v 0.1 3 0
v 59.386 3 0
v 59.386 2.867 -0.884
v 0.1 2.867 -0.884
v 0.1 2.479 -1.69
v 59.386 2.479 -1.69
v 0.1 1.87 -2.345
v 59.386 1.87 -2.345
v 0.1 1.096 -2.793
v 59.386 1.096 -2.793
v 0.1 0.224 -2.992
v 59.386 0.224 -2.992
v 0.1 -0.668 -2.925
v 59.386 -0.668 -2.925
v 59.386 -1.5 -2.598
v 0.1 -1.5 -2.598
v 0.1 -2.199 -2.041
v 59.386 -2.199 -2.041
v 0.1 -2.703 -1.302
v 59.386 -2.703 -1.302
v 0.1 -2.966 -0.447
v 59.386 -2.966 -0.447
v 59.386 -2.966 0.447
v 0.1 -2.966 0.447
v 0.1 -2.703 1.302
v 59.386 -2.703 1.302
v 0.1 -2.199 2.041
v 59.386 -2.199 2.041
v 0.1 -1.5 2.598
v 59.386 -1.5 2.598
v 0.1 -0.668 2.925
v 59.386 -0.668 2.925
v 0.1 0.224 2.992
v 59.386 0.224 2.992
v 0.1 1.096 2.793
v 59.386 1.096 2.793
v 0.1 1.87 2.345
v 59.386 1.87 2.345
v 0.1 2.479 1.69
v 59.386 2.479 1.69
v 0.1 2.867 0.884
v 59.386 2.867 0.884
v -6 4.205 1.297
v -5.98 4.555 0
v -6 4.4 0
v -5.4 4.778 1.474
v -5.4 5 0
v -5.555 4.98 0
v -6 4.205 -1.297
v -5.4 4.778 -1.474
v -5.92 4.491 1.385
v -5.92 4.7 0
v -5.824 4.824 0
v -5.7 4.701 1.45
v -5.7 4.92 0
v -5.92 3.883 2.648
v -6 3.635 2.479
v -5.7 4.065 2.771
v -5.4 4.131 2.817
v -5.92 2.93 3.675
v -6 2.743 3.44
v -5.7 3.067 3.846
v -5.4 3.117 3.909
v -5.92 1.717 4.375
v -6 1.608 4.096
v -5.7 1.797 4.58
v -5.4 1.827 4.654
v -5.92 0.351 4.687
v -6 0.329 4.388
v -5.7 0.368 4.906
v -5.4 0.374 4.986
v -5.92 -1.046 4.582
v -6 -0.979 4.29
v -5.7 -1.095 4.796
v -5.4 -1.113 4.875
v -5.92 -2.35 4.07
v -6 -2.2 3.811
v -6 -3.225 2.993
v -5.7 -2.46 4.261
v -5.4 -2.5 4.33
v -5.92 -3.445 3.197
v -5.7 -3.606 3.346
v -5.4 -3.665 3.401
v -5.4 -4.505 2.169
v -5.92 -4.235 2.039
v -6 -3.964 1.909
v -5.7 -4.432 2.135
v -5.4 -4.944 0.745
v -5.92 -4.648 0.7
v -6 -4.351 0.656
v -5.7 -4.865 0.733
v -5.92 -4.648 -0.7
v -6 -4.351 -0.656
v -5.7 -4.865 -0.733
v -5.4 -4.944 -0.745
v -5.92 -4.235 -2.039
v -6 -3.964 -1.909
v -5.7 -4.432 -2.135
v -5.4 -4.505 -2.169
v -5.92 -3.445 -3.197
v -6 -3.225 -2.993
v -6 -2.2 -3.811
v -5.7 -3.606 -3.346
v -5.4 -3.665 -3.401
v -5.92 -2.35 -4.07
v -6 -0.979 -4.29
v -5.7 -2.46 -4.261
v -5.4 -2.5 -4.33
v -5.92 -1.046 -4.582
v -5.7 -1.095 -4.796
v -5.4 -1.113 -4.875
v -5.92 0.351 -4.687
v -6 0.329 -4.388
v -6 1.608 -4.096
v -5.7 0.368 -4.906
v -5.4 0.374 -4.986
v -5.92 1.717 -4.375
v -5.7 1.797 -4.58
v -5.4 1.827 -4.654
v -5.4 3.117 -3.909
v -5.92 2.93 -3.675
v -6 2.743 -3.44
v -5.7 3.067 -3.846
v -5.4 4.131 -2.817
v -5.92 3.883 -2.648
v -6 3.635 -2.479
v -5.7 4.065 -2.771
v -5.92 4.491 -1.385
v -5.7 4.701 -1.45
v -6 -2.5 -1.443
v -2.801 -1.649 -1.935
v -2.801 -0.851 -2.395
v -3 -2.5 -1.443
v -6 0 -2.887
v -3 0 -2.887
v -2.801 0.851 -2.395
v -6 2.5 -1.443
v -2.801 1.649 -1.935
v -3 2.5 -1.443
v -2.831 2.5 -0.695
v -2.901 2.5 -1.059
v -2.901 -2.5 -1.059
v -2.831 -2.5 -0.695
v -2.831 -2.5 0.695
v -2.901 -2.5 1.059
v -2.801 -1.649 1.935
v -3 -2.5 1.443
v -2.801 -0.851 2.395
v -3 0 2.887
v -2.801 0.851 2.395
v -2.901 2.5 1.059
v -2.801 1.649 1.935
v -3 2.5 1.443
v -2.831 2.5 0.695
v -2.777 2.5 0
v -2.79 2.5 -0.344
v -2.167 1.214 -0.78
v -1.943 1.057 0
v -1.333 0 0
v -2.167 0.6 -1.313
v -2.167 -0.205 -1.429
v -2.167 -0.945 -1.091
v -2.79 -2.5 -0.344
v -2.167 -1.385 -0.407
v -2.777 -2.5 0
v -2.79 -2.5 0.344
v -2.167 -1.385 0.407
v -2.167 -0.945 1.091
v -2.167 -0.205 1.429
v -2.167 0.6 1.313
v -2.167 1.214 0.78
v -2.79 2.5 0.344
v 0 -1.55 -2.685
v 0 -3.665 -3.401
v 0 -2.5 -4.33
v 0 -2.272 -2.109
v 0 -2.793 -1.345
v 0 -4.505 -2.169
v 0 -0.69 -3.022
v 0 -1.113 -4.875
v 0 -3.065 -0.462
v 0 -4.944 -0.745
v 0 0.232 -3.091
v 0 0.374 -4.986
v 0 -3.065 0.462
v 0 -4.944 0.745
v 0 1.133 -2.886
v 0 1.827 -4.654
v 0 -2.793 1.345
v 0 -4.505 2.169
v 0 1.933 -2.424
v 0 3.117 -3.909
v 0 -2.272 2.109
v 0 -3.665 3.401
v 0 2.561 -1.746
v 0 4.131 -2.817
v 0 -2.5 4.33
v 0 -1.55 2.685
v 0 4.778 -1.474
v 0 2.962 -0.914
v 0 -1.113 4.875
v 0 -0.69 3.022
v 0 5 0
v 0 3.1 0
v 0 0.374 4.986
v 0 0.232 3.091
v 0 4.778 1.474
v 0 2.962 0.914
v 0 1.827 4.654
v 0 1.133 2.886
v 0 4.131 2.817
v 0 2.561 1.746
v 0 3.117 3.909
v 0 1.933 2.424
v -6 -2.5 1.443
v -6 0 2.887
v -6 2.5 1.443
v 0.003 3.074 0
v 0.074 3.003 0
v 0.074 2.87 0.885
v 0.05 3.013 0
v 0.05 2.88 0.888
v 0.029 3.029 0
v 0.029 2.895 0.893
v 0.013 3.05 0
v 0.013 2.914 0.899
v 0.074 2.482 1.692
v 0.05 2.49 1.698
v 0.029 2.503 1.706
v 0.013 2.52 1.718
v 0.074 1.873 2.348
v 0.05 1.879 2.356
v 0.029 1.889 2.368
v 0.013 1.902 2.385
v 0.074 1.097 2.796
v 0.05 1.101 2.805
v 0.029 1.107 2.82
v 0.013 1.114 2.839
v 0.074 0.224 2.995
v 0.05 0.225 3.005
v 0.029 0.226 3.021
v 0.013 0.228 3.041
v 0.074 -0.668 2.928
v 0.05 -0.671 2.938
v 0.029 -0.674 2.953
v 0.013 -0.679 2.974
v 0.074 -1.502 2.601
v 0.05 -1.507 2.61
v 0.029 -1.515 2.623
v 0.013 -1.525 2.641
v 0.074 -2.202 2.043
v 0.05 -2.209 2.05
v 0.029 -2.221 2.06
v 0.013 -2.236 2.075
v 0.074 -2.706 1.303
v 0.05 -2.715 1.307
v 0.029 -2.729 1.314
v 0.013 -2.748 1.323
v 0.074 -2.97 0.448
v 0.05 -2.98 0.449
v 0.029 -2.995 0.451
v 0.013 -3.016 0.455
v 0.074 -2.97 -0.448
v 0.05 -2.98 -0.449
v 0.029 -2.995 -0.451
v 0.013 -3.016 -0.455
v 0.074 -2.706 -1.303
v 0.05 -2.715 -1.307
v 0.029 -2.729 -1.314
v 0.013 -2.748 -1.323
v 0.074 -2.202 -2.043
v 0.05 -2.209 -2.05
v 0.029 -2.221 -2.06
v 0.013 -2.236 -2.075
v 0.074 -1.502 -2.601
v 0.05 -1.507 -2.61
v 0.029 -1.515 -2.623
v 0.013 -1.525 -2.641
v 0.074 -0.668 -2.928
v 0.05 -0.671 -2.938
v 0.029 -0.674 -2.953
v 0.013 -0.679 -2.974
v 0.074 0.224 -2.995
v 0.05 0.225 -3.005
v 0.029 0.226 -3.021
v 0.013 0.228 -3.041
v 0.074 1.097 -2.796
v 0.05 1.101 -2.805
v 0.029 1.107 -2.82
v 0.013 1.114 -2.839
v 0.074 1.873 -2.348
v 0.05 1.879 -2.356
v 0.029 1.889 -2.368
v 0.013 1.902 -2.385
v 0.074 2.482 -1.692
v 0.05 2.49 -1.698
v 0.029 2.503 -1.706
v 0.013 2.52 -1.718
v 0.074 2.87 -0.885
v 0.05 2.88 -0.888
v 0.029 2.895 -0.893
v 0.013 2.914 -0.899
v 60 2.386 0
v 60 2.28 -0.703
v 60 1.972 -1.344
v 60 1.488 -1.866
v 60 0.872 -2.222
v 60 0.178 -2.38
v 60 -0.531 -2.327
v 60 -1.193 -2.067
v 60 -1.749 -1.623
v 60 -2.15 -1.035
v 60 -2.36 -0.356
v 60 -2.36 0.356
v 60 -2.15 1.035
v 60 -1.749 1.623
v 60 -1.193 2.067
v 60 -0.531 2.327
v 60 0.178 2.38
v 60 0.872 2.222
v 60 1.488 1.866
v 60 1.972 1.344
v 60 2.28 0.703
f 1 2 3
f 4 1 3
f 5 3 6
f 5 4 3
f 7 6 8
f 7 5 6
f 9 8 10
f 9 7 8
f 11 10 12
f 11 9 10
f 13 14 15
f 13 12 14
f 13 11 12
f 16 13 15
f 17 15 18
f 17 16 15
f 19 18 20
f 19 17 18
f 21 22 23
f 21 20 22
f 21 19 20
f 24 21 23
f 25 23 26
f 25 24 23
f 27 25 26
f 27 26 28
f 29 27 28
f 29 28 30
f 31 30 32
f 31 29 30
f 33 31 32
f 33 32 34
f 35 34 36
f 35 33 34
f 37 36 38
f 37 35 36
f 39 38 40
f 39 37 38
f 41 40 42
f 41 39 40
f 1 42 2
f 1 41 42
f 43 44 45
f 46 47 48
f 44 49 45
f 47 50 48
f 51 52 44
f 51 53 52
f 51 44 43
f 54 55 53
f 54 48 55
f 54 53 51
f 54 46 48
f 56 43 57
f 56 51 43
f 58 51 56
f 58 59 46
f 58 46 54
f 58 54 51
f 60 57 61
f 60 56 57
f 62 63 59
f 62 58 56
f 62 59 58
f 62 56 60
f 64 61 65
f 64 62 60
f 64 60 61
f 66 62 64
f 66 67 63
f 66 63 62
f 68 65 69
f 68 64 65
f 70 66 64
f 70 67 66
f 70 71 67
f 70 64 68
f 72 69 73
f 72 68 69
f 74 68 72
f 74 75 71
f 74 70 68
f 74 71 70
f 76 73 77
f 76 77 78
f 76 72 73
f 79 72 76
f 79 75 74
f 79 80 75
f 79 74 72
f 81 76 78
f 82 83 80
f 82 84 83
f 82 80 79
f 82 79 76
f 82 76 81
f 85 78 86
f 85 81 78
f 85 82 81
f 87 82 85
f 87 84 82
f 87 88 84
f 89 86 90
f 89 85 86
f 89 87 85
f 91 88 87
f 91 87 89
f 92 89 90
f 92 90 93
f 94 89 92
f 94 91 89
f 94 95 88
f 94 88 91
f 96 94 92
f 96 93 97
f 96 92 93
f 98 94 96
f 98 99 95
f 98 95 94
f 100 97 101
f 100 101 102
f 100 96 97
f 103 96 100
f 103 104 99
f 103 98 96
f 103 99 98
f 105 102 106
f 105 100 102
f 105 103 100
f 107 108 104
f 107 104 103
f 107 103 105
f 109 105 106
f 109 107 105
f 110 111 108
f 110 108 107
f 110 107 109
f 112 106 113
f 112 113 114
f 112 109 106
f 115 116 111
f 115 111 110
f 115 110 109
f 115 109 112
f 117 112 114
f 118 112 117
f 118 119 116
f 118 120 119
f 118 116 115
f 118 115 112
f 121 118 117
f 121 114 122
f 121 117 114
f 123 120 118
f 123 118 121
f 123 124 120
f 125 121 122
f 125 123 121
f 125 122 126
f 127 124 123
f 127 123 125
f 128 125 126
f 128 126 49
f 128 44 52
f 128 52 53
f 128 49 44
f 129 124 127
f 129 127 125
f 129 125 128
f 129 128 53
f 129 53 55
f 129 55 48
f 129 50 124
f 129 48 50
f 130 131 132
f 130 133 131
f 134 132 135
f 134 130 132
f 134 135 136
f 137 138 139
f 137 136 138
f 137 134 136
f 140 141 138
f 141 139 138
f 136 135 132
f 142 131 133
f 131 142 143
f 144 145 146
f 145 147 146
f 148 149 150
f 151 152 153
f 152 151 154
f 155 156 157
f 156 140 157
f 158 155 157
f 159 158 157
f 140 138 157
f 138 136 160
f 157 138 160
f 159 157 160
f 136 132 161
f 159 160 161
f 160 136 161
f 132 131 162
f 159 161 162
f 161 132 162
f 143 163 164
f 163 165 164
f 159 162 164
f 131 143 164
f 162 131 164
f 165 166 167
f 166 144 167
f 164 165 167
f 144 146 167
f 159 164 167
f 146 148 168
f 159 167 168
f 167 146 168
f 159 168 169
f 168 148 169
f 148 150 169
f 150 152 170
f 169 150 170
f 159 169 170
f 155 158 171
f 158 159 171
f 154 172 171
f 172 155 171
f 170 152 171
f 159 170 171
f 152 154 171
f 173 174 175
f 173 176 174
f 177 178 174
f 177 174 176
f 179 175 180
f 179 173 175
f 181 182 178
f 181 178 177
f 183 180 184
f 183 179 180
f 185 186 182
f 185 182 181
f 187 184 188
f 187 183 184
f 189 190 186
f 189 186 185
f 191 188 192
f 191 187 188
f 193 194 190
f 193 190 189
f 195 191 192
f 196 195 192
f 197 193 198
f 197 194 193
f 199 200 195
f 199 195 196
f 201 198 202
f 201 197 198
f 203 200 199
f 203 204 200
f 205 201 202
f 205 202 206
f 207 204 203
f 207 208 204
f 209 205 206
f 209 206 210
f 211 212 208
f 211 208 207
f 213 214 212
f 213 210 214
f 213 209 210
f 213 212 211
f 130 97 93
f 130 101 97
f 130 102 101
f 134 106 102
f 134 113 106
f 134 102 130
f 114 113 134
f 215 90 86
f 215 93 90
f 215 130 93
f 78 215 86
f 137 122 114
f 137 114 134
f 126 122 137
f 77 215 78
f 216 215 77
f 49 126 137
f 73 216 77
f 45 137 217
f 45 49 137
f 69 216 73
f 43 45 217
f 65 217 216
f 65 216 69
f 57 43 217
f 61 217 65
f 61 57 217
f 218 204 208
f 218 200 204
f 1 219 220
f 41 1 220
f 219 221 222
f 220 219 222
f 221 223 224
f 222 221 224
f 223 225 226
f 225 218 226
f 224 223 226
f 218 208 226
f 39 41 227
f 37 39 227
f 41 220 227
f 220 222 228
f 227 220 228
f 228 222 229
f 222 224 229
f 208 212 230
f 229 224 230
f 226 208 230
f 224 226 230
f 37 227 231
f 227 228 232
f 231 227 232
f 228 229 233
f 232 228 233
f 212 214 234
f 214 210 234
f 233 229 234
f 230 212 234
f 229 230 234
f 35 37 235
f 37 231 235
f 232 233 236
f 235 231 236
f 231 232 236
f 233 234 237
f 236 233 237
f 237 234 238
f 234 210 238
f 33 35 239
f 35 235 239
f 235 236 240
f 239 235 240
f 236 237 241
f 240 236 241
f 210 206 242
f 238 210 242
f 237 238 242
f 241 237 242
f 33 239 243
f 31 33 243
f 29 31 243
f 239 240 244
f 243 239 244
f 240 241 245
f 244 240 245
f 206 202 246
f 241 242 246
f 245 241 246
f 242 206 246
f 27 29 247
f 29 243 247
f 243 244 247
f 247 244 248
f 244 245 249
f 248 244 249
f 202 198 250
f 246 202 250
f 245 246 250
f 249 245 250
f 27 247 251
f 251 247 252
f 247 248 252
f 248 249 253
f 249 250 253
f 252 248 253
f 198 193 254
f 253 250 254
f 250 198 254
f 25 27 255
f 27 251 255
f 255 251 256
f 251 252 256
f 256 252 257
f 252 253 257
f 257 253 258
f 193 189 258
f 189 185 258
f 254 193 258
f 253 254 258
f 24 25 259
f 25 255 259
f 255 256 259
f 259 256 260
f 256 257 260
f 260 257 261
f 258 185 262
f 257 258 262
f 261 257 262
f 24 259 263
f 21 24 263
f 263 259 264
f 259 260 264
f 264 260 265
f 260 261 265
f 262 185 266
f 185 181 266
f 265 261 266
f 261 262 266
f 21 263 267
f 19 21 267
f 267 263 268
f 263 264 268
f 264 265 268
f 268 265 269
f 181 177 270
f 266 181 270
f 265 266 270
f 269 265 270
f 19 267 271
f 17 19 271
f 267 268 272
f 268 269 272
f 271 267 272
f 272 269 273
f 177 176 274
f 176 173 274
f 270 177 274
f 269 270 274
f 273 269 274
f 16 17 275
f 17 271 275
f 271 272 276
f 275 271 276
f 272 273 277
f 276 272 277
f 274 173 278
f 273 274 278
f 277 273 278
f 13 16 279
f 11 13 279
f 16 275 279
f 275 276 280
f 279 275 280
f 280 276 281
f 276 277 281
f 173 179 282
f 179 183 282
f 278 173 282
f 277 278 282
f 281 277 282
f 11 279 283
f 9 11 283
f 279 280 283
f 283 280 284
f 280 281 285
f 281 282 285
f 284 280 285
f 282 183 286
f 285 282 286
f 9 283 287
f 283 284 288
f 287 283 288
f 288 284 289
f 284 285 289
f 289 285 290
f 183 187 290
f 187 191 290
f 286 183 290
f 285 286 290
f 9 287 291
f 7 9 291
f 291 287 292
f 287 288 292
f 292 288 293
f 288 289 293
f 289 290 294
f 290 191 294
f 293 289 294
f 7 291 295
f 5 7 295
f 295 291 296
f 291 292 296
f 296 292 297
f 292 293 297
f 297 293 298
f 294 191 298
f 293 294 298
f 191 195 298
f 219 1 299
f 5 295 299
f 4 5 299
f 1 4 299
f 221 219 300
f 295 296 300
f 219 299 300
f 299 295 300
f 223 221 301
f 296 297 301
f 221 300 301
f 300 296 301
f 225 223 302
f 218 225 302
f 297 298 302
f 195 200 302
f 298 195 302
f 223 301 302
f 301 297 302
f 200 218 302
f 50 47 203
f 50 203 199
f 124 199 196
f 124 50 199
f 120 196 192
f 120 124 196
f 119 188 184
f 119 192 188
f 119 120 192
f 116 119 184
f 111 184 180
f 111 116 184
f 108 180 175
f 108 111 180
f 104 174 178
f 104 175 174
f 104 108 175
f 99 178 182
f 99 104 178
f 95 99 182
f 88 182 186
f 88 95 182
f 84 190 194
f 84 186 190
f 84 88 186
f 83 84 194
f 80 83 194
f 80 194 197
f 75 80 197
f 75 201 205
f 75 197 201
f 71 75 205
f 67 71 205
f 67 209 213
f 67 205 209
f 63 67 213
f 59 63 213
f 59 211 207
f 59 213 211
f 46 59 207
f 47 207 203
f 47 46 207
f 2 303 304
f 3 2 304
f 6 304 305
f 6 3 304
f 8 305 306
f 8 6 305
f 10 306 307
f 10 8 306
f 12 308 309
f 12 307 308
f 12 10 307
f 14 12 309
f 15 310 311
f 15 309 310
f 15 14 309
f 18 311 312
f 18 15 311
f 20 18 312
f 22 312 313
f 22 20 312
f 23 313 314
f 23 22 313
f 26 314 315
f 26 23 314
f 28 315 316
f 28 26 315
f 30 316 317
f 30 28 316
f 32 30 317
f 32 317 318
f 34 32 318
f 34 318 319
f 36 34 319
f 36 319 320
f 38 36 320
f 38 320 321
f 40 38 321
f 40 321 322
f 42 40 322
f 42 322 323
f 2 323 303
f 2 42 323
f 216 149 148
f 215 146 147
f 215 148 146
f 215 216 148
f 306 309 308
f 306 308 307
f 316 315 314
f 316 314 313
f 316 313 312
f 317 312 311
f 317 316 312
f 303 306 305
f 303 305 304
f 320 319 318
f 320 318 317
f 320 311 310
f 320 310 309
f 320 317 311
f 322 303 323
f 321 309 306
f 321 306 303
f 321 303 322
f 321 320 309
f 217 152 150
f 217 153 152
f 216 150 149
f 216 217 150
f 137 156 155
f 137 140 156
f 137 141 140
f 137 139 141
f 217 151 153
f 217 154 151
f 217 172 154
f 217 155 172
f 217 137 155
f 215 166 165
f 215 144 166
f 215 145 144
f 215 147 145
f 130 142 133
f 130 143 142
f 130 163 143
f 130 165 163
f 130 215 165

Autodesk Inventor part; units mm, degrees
ref_plane "YZ Plane" through (0, 0, 0) normal (1, 0, 0) x (0, 1, 0)
ref_plane "XZ Plane" through (0, 0, 0) normal (0, 1, 0) x (-1, 0, 0)
sketch "Sketch1" plane through (0, 0, 0) normal (0, 0, 1) x (1, 0, 0)
  line L0 (-1.3333, 0) -> (60, 0)
  line L1 (60, 0) -> (60, 3)
  line L2 (60, 3) -> (42, 3)
  line L3 (42, 3) -> (41.3865, 3)
  line L4 (41.3865, 3) -> (0, 3)
  line L5 (0, 3) -> (0, 5)
  line L6 (0, 5) -> (-6, 5)
  line L7 (-6, 5) -> (-6, 2.8868)
  line L8 (-6, 2.8868) -> (-3, 2.8868)
  line L9 (-3, 2.8868) -> (-1.3333, 0)
  line L10 (-19.2, 0) -> (73.2, 0) projected
  line L11 (0, -1) -> (0, 6) projected
  line L12 (42, 3) -> (0, 3) construction
  dimension "d1" = 18
  dimension "d2" = 0.6136
  dimension "d3" = 6
  dimension "d4" = 3
  dimension "d5" = 60
  dimension "d6" = 6
  dimension "d7" = 6
  dimension "d8" = 5.7735
  dimension "d9" = 10
  dimension "d26" = 60
revolve "Body" add sketch "Sketch1" angle 360 about axis through (-1.3333, 0, 0) along (1, 0, 0)
sketch "Sketch2" plane through (-6, 0, 0) normal (-1, 0, 0) x (0, 0, 1)
  circle A0 centre (0, 0) radius 2.8868 projected
  line L0 (0, -7) -> (0, 7) projected
  line L1 (-7, 0) -> (7, 0) projected
  line L2 (2.8868, 0) -> (1.4434, -2.5)
  line L3 (1.4434, -2.5) -> (-1.4434, -2.5)
  line L4 (-1.4434, -2.5) -> (-2.8868, 0)
  line L5 (-2.8868, 0) -> (-1.4434, 2.5)
  line L6 (-1.4434, 2.5) -> (1.4434, 2.5)
  line L7 (1.4434, 2.5) -> (2.8868, 0)
extrude "Slot" add sketch "Sketch2" against normal up to next contours L7 A0 | A0 L2 | L6 L0 A0 | A0 L0 L3 | L0 L6 A0 | A0 L3 L0 | L4 A0 | A0 L5
fillet "Fillet1" radius 0.6 1 edges at (-6, -5, 0)
thread "Thread" size "M6x1" class "6g" standard "ISO Metric profile" length 18
chamfer "Chamfer1" distance 0.6135 distance2 0.6135 1 edges at (60, -3, 0) measured on face at (60, 1.5134, 0.7943)
ref_plane "Work Plane1" through (29, 0, 0) normal (0, -1, 0) x (1, 0, 0)
fillet "Fillet2" radius 0.1 1 edges at (0, -3, 0)
equation "\"d1\" = GEL"
equation "\"d3\" = KOH"
equation "\"d4\" = INTI"
equation "\"d6\" = GD"
equation "\"d7\" = BDM"
equation "\"d8\" = 1.1547 * SW"
equation "\"d9\" = KOD"
equation "\"d26\" = NLG"
equation "\"d30\" = R"
equation "\"d17\" = RR"
equation "\"d13\" = GEL"
equation "\"d15\" = -0.5 * SPD + 0.5 * GD"
equation "\"d16\" = GUL"
equation "\"GD\" = NND"
equation "\"NLG\" = 60"
equation "\"GEL\" = 18"
equation "\"KOD\" = 10"
equation "\"KOH\" = NND"
equation "\"INTI\" = 3"
equation "\"GAL\" = 0.61345 * PTC"
equation "\"GUL\" = 0.61345 * PTC"
equation "\"BDM\" = NND"
equation "\"SW\" = 5"
equation "\"RR\" = 0.1 * NND"
equation "\"SPD\" = NND - 1.2269 * PTC"
equation "\"R\" = 0.1"
equation "\"PHH\" = 0.2"
equation "\"GD1\" = THREADDIA - 1.2269 * PTC"
equation "\"THREADDIA\" = 6"
equation "\"FAWI\" = 45deg"
equation "\"PTC\" = 1"
equation "\"KOH1\" = 5.4"
equation "\"NND\" = 6"
equation "\"TOA\" = 30deg"
equation "\"E0\" = 1.155 * SW"
properties part number "AS 1420 - 1973 - M6 x 60" material "Steel, Mild"
